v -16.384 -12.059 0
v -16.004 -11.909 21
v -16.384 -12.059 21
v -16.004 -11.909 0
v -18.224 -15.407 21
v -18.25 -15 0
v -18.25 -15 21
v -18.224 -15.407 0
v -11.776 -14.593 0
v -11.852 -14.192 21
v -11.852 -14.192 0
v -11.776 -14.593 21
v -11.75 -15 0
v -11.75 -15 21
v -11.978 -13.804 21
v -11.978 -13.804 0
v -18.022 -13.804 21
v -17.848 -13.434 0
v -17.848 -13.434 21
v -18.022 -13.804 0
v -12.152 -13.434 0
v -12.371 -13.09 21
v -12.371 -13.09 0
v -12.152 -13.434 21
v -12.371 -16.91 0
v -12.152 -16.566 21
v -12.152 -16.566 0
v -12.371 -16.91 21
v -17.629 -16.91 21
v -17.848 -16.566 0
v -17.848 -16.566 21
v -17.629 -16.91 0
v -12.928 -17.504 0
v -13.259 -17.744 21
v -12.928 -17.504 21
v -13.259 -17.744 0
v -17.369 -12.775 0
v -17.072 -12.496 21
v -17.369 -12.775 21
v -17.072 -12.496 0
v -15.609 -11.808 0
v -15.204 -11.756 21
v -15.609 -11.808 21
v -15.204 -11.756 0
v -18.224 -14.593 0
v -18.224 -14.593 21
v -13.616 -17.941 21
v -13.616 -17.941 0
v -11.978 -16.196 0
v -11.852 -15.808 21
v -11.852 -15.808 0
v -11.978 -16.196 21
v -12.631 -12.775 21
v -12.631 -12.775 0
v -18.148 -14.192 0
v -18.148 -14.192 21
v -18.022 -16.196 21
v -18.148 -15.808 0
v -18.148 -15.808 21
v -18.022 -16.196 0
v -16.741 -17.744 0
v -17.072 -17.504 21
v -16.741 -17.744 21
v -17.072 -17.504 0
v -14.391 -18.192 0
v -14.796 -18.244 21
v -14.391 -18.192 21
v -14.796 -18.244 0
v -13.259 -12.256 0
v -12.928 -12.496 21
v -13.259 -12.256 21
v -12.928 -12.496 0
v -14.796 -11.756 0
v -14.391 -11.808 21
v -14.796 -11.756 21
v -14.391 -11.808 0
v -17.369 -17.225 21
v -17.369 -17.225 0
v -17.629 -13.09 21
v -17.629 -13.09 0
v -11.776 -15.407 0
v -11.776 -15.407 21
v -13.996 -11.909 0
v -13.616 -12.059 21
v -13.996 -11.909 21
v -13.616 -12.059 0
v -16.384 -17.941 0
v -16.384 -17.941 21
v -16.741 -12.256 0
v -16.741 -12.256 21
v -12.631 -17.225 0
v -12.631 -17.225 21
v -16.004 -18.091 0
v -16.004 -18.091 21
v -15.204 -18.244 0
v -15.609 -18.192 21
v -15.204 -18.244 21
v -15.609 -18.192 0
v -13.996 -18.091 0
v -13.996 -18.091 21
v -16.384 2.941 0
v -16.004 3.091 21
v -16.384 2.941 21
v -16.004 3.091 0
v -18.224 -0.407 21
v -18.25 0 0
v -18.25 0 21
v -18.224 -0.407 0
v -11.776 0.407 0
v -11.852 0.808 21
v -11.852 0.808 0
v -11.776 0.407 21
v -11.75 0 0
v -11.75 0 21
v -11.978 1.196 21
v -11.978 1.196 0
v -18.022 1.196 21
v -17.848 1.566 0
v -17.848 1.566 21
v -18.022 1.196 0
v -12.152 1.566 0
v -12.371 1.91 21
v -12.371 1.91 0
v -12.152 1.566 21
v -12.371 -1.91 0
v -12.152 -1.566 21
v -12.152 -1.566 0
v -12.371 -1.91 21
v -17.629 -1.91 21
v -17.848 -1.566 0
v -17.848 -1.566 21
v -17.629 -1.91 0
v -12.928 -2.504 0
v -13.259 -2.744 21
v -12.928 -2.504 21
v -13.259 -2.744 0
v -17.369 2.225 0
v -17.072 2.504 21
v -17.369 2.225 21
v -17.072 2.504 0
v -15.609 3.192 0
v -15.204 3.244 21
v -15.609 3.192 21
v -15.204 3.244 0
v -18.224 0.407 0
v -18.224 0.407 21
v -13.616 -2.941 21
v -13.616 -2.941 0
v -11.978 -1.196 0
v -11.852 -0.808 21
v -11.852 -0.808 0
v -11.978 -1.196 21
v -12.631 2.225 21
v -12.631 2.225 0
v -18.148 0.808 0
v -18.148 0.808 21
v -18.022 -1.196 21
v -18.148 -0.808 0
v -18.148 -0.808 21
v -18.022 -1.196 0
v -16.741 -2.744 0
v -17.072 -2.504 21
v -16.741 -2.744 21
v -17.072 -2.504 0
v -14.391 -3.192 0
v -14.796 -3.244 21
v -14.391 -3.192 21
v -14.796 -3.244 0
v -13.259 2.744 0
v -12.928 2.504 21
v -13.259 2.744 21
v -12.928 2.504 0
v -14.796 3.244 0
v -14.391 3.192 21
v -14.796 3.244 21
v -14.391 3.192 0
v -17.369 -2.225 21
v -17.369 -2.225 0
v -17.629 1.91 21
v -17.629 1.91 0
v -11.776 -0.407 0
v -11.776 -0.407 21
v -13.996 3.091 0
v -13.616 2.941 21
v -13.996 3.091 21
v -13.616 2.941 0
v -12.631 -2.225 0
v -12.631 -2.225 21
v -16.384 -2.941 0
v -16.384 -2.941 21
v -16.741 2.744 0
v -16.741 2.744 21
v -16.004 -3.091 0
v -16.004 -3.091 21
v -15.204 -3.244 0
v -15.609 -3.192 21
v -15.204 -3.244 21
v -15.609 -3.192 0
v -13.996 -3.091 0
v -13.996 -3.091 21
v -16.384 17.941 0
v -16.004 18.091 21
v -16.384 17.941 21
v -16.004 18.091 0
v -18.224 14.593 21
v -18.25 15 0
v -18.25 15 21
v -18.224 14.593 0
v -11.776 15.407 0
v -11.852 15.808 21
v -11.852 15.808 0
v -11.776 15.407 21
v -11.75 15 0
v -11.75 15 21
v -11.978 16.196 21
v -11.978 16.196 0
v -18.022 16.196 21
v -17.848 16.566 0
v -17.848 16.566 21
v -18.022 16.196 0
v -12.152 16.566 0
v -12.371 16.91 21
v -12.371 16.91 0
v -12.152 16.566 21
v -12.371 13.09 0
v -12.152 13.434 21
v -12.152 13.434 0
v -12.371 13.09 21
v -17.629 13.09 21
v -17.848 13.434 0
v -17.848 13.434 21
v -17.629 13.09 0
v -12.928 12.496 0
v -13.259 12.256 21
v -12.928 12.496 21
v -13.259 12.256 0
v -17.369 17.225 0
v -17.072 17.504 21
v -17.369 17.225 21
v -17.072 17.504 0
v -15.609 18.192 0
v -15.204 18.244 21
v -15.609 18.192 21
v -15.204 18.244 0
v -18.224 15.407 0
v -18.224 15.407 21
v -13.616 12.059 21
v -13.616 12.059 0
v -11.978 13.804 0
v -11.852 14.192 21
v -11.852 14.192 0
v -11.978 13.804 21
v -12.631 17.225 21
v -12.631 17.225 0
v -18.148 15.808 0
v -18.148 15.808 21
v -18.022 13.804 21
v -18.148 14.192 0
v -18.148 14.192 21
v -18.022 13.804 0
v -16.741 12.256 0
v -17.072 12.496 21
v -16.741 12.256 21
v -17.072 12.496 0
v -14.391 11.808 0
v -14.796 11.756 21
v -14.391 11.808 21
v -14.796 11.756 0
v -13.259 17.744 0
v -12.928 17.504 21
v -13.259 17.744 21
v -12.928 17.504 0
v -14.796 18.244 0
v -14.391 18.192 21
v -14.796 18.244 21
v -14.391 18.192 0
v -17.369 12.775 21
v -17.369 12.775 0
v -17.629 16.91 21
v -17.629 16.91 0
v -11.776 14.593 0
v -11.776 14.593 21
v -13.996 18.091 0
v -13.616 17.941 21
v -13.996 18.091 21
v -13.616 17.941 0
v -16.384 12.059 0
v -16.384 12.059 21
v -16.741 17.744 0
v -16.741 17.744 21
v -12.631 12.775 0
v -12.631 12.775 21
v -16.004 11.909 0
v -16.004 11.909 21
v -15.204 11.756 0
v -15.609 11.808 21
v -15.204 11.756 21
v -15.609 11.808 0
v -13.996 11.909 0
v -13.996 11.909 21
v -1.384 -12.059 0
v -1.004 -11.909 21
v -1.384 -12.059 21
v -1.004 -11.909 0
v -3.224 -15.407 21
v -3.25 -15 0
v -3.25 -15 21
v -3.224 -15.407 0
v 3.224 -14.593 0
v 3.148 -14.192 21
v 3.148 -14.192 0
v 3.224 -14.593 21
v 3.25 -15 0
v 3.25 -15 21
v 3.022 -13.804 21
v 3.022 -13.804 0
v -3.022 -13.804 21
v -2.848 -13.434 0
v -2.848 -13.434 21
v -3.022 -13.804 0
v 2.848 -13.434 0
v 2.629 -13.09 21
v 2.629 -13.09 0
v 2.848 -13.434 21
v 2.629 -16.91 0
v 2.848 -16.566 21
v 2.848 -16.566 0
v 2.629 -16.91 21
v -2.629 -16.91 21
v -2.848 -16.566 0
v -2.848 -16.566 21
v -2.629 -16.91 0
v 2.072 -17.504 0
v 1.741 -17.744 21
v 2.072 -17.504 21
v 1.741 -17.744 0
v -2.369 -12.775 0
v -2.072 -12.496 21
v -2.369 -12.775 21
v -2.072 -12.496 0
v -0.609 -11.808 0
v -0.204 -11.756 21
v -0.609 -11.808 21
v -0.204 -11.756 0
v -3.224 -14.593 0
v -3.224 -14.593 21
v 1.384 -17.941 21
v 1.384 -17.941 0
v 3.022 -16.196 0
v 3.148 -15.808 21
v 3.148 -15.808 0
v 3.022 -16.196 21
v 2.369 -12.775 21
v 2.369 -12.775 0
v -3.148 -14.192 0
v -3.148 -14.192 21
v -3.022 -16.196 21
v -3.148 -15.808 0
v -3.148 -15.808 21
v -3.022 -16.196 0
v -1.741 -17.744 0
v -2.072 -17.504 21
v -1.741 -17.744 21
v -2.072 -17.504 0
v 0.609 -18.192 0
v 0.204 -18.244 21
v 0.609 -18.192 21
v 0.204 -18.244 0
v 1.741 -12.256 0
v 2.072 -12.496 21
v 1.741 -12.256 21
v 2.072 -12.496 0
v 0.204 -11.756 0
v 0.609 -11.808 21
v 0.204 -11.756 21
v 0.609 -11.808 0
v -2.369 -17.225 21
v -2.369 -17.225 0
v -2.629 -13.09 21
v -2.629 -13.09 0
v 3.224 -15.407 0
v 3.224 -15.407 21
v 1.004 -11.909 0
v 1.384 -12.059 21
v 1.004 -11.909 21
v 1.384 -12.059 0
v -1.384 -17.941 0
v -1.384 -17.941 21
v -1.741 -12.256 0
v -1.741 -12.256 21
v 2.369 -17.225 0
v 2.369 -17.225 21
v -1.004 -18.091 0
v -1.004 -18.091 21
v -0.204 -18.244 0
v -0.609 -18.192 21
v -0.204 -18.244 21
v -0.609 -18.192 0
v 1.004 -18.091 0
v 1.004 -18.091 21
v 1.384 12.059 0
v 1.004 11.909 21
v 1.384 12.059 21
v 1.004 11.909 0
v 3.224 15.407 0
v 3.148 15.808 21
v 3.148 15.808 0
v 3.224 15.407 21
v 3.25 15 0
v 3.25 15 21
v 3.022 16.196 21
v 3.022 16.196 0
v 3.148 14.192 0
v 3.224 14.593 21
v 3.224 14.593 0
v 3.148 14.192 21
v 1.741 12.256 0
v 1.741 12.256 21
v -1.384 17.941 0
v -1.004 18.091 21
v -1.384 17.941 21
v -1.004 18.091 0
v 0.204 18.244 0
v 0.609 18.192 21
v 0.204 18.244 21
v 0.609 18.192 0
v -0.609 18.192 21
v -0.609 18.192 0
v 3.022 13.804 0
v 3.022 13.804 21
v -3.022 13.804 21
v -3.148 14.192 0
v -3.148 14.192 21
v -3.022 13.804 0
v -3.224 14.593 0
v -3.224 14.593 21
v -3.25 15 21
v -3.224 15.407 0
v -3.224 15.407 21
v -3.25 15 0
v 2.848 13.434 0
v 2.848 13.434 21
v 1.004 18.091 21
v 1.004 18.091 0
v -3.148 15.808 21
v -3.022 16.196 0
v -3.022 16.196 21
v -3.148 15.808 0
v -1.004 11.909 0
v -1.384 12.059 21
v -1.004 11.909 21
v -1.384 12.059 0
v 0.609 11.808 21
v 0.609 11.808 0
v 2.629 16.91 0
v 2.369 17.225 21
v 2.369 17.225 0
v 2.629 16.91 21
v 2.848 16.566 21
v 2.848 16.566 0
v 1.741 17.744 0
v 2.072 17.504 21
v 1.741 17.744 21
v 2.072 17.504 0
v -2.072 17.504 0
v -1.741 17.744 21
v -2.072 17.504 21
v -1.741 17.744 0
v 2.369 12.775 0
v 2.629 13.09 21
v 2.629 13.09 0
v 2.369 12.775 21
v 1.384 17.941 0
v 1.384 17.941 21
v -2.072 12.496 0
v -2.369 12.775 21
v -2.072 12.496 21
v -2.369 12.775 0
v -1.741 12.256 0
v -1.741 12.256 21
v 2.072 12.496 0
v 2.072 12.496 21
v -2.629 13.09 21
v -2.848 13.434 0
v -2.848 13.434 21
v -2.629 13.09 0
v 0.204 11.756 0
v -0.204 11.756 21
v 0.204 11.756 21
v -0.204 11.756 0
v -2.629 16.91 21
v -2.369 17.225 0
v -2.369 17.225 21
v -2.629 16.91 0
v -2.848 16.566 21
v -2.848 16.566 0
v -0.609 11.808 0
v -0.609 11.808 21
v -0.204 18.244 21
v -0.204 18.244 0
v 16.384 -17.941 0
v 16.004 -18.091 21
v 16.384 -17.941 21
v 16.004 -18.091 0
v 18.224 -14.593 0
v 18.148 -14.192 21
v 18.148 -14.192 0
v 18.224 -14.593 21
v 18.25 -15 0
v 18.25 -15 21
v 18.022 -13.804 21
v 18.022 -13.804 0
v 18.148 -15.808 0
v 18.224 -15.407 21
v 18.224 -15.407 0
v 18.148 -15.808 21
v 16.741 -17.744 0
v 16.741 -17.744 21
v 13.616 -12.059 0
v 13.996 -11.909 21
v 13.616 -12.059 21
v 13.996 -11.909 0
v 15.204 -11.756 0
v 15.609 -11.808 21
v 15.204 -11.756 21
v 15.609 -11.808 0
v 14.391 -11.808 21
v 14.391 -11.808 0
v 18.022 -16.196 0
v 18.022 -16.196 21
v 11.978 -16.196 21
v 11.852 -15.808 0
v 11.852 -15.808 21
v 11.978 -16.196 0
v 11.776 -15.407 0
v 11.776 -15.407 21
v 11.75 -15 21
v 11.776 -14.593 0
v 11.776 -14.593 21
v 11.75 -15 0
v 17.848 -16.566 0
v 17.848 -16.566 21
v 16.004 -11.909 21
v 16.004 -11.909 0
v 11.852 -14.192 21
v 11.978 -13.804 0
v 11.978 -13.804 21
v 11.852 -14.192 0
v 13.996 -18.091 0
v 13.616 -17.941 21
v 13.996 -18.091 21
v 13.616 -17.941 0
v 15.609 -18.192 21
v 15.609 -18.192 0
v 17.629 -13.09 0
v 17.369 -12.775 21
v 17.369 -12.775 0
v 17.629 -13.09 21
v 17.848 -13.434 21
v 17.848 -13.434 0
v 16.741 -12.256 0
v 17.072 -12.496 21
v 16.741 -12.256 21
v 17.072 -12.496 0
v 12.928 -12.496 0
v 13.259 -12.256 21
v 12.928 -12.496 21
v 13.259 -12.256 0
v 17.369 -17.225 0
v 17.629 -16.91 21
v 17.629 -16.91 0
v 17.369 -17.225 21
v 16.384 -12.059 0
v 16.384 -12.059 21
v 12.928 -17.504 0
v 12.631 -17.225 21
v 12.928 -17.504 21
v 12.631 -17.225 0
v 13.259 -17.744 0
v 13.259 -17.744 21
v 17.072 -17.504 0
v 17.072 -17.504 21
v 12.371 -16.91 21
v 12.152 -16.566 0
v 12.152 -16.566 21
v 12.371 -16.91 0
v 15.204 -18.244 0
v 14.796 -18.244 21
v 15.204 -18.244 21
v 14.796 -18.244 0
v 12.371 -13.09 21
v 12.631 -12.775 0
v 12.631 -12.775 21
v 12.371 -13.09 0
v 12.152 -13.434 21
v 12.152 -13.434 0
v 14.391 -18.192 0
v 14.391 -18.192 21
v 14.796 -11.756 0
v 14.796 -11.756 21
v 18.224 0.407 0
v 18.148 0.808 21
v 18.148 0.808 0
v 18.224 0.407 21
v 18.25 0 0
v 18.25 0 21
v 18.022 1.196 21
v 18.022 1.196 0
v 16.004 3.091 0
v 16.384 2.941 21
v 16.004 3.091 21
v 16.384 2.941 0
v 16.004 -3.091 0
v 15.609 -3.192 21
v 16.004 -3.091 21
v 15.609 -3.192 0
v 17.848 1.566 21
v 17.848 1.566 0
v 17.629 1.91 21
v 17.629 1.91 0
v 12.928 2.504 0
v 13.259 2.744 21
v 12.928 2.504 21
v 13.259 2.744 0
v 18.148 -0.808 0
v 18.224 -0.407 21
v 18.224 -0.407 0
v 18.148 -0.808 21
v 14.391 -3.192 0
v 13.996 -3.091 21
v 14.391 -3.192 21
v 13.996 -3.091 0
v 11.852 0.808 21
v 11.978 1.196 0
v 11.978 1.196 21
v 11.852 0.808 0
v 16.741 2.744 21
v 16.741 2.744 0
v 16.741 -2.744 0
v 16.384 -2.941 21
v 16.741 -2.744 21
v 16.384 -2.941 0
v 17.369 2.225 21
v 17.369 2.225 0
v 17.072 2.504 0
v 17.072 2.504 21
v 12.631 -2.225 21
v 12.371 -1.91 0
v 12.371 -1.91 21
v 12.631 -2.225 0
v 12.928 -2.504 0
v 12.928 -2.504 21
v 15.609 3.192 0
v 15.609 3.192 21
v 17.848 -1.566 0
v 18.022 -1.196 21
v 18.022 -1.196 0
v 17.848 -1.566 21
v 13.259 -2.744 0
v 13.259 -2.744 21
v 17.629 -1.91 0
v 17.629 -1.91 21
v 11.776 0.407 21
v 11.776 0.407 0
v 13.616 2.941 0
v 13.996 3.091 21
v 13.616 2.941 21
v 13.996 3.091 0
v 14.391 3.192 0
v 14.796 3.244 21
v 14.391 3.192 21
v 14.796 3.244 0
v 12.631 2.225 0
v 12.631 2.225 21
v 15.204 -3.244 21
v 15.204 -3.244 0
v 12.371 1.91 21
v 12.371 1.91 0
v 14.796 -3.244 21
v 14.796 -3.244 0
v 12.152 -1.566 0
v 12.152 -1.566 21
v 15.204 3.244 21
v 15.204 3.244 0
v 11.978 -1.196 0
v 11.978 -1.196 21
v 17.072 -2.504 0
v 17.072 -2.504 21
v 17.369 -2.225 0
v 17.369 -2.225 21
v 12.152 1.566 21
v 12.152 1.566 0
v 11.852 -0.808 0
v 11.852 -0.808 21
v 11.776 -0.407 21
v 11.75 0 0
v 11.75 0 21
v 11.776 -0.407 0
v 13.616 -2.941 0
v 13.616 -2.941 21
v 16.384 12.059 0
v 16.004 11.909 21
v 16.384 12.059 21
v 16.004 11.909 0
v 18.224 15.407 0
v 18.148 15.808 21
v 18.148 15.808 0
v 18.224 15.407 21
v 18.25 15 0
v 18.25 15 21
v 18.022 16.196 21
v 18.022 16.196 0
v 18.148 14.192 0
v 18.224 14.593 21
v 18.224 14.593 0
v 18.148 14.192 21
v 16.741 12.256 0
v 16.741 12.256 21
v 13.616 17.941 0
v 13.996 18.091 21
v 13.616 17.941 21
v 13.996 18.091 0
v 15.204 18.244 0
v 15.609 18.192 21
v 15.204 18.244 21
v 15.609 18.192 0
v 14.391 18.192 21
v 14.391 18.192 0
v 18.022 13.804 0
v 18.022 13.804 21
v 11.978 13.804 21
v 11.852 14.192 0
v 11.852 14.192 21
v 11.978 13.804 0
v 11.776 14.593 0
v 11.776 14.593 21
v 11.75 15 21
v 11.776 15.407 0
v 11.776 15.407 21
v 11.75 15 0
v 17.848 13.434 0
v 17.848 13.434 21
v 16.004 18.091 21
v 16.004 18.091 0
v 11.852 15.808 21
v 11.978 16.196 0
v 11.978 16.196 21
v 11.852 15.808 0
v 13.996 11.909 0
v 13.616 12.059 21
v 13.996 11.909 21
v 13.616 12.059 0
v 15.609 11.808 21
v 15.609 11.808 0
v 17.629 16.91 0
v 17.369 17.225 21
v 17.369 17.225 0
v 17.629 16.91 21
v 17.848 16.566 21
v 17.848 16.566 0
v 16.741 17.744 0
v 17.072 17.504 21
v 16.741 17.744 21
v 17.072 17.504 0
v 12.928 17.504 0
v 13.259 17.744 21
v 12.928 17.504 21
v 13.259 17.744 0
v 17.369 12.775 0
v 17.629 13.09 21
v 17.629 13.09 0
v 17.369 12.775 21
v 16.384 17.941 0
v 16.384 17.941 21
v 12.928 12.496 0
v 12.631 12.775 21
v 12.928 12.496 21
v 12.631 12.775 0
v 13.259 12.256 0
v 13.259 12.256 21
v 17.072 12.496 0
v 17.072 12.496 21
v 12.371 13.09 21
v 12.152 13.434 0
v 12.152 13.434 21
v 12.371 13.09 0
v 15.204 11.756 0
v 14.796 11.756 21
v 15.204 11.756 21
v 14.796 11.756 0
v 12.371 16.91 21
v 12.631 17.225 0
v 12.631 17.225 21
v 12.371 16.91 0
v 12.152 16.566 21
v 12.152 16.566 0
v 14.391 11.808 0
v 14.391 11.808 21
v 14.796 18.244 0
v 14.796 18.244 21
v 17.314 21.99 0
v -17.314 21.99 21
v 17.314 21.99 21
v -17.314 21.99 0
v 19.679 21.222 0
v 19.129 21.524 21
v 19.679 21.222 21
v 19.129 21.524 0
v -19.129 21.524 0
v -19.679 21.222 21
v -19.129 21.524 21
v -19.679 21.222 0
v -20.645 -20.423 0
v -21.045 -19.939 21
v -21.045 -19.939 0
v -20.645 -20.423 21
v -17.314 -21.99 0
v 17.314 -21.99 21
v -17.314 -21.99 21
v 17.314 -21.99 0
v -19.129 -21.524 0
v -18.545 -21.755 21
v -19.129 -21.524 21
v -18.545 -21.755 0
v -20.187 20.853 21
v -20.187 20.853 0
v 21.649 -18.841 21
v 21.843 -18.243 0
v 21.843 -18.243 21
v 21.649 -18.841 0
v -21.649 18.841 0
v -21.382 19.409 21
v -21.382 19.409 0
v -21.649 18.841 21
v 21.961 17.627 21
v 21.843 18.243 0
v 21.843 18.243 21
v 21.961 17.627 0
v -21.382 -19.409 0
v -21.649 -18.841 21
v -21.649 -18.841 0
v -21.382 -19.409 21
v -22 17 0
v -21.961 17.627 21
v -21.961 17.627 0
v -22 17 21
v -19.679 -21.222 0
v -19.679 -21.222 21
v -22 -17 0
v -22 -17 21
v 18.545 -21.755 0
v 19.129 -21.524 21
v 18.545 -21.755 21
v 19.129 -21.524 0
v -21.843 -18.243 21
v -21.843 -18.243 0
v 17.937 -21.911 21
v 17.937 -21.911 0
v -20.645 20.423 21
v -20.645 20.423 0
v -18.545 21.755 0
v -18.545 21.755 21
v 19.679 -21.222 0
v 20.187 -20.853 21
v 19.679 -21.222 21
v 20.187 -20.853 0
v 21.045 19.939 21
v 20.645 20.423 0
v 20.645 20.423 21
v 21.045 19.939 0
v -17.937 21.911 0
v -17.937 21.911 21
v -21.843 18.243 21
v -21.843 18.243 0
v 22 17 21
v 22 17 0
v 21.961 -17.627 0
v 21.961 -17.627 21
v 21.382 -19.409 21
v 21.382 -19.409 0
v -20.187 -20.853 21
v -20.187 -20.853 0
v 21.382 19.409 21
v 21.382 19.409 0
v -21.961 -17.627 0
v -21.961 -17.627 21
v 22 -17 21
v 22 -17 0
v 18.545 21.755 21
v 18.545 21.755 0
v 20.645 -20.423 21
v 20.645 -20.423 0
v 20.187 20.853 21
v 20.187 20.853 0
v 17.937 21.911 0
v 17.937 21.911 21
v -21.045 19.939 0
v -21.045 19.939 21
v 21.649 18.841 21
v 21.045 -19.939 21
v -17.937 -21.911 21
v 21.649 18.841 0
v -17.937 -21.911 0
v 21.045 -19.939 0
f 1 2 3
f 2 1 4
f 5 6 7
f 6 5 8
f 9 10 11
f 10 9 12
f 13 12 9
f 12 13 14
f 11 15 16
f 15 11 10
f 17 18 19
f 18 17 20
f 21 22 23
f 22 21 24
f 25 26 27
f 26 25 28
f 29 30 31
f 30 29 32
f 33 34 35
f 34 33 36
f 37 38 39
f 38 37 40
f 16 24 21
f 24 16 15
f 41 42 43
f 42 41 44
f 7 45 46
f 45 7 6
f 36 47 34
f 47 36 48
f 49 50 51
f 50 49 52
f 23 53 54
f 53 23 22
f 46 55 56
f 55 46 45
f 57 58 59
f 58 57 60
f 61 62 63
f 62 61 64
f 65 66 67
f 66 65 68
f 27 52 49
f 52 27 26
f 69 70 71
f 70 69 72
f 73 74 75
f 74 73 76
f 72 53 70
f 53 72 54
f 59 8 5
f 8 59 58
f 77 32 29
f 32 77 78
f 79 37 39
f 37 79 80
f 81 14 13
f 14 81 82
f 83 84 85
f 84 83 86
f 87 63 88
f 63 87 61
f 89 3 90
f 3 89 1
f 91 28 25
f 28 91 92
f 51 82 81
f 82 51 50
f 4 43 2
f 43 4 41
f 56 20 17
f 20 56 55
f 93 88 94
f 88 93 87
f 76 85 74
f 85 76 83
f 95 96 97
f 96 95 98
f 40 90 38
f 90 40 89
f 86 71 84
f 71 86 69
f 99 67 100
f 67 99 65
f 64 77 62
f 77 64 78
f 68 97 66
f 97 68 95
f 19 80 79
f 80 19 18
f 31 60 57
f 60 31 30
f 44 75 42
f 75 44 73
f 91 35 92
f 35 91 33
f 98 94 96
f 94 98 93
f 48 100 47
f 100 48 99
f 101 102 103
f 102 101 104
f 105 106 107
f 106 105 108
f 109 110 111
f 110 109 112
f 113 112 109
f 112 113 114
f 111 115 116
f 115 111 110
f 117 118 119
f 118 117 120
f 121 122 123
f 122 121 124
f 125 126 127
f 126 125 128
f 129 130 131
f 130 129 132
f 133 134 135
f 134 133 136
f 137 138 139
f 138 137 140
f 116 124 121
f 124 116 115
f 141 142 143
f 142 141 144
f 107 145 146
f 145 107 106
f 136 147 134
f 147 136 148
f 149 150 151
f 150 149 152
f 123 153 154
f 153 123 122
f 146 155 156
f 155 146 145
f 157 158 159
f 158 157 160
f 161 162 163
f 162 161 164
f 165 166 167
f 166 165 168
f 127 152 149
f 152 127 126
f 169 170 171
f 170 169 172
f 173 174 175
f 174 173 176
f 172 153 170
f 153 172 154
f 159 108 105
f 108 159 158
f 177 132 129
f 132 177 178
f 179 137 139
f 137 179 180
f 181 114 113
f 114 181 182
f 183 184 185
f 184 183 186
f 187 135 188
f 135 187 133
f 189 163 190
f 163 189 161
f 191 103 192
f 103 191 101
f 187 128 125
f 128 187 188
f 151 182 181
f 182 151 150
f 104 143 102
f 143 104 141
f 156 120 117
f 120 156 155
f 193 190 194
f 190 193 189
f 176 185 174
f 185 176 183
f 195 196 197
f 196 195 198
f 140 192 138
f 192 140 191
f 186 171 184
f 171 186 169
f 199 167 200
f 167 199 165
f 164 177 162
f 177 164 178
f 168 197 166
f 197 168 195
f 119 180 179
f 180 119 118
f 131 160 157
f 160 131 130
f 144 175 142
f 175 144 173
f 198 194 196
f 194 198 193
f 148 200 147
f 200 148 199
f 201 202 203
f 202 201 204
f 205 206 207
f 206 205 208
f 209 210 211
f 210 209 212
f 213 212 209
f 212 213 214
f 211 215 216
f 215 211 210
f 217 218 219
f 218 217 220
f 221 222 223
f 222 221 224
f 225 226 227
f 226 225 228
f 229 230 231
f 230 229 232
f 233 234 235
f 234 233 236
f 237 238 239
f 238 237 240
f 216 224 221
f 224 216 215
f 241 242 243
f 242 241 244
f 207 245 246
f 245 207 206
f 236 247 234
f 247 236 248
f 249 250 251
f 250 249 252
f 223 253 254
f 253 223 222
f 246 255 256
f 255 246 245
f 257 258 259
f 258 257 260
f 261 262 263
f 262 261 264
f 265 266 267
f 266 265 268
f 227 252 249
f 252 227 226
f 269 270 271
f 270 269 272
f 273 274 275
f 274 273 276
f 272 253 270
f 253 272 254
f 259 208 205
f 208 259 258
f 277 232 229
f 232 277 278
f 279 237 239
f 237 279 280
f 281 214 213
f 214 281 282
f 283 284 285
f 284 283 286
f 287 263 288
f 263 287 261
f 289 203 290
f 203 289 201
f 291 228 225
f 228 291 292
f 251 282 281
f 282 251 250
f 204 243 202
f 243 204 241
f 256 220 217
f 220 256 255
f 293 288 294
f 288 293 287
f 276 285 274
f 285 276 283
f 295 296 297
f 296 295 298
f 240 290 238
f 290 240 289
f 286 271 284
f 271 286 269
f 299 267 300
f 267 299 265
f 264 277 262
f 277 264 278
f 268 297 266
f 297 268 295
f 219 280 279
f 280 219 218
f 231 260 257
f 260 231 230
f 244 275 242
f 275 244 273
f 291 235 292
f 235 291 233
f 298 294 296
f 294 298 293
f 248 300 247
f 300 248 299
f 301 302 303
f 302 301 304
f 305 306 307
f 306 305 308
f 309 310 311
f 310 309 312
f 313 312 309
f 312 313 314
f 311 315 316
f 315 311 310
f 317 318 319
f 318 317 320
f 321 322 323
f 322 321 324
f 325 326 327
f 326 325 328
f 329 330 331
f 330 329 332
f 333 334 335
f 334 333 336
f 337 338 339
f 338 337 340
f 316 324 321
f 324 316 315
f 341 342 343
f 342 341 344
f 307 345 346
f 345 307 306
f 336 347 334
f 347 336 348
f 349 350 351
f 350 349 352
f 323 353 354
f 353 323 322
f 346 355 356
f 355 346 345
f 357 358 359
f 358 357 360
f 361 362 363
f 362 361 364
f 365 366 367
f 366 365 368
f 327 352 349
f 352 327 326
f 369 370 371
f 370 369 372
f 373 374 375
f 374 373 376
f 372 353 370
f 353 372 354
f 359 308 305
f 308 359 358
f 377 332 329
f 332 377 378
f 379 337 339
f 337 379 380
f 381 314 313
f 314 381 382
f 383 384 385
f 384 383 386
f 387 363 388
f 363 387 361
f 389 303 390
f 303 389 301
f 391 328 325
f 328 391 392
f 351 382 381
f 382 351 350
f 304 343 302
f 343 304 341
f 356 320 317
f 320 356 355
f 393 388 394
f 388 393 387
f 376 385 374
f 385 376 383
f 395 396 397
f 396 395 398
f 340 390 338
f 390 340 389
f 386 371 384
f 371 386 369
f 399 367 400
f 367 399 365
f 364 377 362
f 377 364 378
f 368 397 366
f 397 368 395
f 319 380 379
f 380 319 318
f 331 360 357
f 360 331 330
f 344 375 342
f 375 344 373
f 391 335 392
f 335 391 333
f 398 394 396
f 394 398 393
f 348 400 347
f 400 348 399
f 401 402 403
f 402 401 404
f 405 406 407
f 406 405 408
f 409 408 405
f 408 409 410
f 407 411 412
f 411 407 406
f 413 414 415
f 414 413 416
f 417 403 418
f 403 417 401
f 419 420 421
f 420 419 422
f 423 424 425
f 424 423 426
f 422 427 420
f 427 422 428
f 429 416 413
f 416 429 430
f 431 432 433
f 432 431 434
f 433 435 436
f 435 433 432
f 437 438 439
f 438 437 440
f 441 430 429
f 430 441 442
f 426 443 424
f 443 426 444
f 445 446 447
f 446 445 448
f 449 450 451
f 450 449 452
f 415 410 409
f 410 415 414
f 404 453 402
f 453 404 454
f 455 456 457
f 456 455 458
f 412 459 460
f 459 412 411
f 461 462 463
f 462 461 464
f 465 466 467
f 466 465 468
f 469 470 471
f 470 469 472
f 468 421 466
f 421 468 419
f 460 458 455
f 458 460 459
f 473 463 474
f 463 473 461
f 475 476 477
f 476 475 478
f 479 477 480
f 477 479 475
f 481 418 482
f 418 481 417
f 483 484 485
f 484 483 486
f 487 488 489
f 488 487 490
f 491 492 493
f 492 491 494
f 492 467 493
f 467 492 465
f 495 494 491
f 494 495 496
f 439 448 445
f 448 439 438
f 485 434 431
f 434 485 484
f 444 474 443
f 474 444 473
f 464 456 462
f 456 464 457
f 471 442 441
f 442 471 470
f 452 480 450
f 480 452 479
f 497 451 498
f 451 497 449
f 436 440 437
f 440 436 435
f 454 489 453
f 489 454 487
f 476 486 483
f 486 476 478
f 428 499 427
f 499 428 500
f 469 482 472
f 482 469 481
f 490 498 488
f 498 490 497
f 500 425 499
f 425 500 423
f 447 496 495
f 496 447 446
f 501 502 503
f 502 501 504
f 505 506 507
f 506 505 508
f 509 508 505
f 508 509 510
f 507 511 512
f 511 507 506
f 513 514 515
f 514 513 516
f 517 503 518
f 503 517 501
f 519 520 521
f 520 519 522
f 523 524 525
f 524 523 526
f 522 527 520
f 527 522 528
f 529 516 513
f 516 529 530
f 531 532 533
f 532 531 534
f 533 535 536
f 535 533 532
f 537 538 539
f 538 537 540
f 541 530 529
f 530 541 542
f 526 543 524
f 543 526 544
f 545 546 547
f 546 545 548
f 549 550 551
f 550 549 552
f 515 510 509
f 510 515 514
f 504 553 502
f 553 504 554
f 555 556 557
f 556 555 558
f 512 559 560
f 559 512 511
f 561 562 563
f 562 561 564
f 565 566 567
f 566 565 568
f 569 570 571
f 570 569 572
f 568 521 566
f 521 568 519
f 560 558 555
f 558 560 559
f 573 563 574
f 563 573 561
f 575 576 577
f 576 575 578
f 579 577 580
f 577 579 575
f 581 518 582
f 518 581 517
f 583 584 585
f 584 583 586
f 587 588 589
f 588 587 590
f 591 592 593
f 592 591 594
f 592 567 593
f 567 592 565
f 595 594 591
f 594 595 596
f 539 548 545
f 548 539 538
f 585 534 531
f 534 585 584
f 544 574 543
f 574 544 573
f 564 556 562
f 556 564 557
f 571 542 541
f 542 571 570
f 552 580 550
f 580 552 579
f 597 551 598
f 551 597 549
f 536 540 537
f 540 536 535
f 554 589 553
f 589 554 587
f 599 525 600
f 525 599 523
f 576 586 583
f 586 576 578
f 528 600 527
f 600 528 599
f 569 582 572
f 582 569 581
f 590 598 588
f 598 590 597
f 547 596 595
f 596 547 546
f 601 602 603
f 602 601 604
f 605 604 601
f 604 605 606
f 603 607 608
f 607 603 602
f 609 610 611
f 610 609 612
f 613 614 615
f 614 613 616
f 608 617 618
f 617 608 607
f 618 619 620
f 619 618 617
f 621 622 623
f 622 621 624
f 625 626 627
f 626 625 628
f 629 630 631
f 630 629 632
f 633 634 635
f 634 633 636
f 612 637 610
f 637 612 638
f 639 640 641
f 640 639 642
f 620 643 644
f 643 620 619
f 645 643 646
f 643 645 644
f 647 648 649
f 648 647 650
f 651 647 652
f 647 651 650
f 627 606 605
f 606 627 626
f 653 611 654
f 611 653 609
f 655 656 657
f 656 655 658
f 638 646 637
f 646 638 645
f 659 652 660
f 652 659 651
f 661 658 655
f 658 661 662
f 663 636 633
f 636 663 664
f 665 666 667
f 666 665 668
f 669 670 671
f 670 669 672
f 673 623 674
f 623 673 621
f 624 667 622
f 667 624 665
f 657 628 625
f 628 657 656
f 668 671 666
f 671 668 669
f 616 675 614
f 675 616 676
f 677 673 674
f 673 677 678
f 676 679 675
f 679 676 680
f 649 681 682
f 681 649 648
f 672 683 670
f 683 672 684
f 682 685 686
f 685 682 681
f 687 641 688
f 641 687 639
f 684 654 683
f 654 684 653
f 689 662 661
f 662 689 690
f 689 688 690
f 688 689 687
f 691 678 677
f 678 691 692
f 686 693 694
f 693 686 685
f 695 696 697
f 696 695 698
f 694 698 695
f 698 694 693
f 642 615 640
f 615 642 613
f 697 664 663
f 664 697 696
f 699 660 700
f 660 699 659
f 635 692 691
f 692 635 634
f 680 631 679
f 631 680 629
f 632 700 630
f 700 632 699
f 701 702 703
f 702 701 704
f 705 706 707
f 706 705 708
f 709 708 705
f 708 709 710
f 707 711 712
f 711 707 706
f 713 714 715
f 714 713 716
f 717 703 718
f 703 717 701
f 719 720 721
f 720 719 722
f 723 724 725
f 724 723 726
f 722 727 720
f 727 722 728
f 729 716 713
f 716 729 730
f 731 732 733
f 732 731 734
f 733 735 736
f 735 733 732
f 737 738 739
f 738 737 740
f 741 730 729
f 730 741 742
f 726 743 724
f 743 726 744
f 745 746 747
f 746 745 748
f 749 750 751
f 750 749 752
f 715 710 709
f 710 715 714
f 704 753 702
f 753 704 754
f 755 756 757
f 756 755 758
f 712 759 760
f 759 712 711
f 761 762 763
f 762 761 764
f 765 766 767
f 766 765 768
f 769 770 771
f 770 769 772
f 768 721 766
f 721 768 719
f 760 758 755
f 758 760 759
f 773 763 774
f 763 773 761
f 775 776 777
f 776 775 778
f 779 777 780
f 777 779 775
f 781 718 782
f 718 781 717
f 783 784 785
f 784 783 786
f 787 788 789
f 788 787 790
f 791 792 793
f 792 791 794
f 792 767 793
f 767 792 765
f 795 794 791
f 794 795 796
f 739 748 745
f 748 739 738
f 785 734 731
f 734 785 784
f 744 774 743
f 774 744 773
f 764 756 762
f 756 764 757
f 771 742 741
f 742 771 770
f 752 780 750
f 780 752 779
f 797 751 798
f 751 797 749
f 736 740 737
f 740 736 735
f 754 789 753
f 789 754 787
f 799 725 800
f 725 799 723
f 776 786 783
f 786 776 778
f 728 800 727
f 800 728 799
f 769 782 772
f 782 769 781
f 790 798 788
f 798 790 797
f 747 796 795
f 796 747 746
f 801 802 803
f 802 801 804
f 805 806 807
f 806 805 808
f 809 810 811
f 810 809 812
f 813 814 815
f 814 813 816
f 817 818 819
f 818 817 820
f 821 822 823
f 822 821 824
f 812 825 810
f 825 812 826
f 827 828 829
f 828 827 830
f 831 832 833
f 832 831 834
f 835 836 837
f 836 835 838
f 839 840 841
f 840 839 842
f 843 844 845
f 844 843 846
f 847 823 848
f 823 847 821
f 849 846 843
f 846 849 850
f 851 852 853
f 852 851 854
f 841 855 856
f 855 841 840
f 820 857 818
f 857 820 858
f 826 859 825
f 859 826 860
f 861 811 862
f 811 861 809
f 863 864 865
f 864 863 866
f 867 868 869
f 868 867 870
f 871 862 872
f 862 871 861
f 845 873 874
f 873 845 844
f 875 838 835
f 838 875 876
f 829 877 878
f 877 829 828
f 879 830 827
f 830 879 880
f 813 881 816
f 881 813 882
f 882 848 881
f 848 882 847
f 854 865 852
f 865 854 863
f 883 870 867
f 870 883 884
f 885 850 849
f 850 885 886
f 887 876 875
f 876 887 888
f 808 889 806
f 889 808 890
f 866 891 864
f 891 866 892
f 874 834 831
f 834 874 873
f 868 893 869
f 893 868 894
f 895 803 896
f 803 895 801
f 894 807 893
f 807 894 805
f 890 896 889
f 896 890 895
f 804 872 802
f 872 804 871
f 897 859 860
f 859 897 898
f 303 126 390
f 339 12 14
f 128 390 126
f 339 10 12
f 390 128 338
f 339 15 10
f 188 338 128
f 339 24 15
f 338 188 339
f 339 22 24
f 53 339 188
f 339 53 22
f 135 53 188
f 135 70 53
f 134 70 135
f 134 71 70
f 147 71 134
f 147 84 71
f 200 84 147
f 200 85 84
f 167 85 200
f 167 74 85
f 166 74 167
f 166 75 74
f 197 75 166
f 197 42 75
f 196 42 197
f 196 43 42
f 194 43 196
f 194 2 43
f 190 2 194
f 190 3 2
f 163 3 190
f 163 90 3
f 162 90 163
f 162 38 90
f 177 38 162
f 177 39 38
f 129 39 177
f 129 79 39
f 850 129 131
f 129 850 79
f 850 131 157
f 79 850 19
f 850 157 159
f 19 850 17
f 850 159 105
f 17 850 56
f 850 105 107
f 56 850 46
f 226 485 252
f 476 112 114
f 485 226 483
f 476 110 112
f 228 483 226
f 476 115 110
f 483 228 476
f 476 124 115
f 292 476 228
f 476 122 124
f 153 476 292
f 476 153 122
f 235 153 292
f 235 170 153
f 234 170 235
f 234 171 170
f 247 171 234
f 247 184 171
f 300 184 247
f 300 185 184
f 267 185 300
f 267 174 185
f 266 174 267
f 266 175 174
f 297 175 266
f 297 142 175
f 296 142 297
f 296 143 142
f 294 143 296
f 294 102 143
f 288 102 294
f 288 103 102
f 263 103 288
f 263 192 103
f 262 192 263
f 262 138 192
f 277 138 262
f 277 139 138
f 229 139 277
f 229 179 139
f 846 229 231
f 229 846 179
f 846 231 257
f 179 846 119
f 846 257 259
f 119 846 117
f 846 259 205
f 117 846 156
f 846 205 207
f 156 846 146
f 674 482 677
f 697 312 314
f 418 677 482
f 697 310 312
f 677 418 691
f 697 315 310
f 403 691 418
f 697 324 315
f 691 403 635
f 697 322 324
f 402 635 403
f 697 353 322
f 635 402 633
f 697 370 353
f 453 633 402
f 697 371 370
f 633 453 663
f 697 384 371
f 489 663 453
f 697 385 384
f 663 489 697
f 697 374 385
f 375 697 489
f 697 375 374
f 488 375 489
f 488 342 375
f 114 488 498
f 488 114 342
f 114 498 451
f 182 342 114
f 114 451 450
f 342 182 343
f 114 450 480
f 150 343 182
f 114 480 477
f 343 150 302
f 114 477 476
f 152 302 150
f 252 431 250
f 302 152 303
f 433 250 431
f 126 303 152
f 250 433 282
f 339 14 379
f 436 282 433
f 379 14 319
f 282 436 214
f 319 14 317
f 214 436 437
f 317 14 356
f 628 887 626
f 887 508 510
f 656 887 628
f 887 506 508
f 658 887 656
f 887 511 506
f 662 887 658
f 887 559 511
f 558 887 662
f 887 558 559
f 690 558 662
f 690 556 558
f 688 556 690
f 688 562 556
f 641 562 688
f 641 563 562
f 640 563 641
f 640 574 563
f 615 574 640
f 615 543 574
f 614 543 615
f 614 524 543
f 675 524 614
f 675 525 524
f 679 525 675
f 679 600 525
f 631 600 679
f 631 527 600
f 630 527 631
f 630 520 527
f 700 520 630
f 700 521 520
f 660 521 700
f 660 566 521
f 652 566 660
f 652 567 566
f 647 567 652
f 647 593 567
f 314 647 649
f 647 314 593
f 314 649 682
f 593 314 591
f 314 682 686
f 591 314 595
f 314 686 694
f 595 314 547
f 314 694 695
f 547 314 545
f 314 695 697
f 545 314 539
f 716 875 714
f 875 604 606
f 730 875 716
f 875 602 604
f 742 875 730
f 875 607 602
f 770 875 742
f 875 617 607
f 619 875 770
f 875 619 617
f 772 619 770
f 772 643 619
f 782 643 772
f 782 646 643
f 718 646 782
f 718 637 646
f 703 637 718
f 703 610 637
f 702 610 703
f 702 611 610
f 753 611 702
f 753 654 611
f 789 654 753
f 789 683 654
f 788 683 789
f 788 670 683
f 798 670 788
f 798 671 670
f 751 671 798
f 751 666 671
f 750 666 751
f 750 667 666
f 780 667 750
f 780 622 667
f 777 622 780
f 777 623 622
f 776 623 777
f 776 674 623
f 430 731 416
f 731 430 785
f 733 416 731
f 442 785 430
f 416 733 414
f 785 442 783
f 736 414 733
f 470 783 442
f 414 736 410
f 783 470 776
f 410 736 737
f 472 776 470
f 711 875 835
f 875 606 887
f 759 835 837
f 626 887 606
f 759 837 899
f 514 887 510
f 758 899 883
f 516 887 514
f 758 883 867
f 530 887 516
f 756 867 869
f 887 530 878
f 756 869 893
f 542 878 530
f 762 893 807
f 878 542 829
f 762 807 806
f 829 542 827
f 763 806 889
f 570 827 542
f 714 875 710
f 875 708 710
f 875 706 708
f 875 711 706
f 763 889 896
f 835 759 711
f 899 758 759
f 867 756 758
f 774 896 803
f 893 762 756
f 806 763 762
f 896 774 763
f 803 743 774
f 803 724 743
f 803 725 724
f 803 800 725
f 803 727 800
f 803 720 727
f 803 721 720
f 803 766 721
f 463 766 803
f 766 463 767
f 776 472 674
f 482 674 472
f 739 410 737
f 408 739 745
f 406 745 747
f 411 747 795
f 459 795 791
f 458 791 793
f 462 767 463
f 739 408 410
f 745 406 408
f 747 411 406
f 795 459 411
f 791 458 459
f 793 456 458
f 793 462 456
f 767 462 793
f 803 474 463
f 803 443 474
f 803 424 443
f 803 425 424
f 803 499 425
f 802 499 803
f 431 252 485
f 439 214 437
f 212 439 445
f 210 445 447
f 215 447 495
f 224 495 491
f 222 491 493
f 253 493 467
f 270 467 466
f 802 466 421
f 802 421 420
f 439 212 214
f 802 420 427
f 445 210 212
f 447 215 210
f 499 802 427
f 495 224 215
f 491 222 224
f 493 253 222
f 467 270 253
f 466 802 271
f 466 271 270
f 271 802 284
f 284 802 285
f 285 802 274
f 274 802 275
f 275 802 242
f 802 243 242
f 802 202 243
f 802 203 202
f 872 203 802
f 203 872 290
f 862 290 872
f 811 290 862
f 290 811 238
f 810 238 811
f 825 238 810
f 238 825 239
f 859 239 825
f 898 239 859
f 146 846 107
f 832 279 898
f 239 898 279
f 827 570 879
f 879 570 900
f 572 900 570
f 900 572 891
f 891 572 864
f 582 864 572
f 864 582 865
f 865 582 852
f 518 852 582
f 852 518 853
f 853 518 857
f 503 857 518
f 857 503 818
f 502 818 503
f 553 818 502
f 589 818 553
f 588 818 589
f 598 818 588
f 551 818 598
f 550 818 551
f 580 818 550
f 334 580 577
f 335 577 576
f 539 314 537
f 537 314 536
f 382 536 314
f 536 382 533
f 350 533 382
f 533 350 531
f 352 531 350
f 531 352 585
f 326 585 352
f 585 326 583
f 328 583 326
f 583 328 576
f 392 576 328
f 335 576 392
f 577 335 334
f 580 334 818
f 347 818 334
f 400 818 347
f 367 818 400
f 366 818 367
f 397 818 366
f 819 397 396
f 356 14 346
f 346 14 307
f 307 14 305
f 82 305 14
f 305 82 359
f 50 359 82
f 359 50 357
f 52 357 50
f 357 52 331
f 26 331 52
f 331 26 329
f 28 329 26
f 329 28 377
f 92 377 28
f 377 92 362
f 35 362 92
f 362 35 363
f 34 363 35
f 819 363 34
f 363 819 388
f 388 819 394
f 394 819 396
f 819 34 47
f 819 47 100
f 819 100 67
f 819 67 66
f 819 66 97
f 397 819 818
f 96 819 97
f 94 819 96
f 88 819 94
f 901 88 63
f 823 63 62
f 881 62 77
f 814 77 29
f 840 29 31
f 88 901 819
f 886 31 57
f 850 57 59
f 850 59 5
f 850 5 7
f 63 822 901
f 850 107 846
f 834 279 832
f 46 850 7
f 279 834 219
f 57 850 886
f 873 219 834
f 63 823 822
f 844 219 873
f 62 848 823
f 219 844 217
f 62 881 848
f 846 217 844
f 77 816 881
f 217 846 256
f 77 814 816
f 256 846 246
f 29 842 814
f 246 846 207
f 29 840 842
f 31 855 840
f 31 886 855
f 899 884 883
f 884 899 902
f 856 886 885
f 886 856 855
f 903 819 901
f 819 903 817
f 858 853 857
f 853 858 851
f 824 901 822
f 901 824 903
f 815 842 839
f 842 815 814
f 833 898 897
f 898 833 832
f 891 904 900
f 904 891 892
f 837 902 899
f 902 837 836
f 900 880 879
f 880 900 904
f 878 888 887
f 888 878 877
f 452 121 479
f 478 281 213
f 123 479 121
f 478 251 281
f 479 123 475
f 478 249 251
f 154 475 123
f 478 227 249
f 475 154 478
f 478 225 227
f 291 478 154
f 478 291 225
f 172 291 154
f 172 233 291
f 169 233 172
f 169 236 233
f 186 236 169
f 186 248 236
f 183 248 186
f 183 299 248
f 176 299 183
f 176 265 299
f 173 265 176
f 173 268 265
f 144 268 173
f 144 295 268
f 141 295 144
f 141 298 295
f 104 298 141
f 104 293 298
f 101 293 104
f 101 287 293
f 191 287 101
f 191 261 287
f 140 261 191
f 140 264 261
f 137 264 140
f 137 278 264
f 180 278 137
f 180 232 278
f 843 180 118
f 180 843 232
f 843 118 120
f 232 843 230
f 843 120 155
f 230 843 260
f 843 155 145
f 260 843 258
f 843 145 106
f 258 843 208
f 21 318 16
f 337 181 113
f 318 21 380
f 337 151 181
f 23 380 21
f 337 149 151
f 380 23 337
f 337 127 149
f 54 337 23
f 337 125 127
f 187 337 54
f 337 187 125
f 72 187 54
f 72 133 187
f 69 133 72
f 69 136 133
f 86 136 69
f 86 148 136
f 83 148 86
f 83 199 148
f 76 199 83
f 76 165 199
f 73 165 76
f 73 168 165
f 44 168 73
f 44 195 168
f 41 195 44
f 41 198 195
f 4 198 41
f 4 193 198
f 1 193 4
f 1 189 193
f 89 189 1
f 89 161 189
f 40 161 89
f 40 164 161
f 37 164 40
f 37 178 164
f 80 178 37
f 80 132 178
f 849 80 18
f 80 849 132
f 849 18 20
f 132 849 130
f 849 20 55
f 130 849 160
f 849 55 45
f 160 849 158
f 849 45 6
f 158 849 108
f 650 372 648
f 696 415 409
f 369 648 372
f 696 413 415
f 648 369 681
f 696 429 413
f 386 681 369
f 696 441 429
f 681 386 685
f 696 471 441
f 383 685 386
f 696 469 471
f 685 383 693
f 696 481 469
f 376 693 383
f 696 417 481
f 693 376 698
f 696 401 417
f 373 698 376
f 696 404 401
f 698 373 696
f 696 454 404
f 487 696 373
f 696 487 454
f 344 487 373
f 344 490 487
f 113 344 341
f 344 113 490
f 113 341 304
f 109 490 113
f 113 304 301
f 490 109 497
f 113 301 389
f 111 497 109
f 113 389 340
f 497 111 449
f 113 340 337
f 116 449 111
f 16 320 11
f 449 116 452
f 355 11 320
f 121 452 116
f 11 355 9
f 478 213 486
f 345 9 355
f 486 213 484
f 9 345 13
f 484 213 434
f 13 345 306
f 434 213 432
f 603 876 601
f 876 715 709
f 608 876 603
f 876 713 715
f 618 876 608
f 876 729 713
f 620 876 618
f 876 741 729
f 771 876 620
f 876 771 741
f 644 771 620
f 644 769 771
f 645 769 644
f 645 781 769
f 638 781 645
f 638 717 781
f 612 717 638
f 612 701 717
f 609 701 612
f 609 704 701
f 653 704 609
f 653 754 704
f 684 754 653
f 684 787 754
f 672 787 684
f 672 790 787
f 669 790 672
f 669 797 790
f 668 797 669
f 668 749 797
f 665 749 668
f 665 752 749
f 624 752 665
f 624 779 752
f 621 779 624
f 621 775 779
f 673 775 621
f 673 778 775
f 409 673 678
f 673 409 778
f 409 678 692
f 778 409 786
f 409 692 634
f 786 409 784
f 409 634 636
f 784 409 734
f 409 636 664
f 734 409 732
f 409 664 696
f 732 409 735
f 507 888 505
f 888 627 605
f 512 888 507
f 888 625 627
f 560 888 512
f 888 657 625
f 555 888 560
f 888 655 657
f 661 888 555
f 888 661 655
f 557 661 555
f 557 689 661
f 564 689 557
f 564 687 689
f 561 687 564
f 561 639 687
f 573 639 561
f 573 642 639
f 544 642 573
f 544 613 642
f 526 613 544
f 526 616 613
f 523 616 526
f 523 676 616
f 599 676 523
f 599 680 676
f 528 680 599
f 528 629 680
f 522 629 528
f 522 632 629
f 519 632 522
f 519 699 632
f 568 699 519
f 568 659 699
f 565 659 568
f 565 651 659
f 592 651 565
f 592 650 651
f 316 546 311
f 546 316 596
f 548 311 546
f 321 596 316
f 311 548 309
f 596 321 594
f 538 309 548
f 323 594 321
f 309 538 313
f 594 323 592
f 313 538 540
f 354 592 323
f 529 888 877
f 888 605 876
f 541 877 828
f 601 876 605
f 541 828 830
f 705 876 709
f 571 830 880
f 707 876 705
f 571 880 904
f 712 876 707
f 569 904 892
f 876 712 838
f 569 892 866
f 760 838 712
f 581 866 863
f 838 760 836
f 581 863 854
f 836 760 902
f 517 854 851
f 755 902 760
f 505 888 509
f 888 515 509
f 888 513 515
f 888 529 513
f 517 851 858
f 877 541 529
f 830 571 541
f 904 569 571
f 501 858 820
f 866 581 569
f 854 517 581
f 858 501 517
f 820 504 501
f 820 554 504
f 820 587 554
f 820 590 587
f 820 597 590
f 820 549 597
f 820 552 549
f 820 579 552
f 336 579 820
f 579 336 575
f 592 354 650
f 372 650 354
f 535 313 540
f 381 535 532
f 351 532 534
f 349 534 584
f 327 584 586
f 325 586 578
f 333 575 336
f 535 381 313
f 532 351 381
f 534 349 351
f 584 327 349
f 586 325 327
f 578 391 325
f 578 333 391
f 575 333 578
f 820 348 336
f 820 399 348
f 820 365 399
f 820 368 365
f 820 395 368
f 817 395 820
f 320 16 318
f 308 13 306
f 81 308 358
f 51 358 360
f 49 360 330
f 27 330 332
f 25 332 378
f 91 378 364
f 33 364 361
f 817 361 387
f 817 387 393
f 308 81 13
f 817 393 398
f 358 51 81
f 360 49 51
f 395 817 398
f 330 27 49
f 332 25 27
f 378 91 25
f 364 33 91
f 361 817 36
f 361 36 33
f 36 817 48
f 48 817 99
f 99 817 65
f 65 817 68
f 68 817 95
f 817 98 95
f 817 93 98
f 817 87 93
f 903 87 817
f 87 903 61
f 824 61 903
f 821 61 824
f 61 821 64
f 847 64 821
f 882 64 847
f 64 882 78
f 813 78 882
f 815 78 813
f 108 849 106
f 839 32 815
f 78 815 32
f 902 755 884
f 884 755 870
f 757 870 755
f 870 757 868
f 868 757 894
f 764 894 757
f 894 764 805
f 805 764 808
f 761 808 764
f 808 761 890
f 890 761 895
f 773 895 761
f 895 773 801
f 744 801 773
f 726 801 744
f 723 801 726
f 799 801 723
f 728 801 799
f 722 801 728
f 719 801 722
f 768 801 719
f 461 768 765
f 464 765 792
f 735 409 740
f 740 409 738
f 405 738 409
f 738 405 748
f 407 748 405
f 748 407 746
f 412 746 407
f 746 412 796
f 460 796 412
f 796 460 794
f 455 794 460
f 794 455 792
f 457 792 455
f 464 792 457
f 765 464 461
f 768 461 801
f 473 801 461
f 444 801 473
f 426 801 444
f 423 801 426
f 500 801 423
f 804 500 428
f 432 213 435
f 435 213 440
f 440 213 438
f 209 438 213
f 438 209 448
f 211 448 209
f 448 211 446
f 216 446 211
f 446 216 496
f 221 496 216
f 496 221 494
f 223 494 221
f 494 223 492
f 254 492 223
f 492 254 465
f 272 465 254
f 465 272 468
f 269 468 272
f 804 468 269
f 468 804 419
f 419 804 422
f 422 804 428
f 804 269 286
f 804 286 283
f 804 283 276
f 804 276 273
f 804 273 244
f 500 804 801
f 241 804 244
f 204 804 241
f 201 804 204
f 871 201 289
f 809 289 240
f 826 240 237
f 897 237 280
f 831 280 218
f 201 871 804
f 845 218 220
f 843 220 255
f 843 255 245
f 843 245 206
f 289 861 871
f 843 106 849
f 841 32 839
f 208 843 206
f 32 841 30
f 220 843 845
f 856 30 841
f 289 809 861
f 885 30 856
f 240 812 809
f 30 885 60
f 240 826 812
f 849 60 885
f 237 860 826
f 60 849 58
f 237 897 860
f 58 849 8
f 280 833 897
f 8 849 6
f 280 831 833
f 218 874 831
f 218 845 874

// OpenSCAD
$fn = 50;


difference() {
	union() {
		hull() {
			translate(v = [-17.0000000000, 17.0000000000, 0]) {
				cylinder(h = 21, r = 5);
			}
			translate(v = [17.0000000000, 17.0000000000, 0]) {
				cylinder(h = 21, r = 5);
			}
			translate(v = [-17.0000000000, -17.0000000000, 0]) {
				cylinder(h = 21, r = 5);
			}
			translate(v = [17.0000000000, -17.0000000000, 0]) {
				cylinder(h = 21, r = 5);
			}
		}
	}
	union() {
		translate(v = [-15.0000000000, -15.0000000000, -100.0000000000]) {
			cylinder(h = 200, r = 3.2500000000);
		}
		translate(v = [-15.0000000000, 0.0000000000, -100.0000000000]) {
			cylinder(h = 200, r = 3.2500000000);
		}
		translate(v = [-15.0000000000, 15.0000000000, -100.0000000000]) {
			cylinder(h = 200, r = 3.2500000000);
		}
		translate(v = [0.0000000000, -15.0000000000, -100.0000000000]) {
			cylinder(h = 200, r = 3.2500000000);
		}
		translate(v = [0.0000000000, 15.0000000000, -100.0000000000]) {
			cylinder(h = 200, r = 3.2500000000);
		}
		translate(v = [15.0000000000, -15.0000000000, -100.0000000000]) {
			cylinder(h = 200, r = 3.2500000000);
		}
		translate(v = [15.0000000000, 0.0000000000, -100.0000000000]) {
			cylinder(h = 200, r = 3.2500000000);
		}
		translate(v = [15.0000000000, 15.0000000000, -100.0000000000]) {
			cylinder(h = 200, r = 3.2500000000);
		}
	}
}
